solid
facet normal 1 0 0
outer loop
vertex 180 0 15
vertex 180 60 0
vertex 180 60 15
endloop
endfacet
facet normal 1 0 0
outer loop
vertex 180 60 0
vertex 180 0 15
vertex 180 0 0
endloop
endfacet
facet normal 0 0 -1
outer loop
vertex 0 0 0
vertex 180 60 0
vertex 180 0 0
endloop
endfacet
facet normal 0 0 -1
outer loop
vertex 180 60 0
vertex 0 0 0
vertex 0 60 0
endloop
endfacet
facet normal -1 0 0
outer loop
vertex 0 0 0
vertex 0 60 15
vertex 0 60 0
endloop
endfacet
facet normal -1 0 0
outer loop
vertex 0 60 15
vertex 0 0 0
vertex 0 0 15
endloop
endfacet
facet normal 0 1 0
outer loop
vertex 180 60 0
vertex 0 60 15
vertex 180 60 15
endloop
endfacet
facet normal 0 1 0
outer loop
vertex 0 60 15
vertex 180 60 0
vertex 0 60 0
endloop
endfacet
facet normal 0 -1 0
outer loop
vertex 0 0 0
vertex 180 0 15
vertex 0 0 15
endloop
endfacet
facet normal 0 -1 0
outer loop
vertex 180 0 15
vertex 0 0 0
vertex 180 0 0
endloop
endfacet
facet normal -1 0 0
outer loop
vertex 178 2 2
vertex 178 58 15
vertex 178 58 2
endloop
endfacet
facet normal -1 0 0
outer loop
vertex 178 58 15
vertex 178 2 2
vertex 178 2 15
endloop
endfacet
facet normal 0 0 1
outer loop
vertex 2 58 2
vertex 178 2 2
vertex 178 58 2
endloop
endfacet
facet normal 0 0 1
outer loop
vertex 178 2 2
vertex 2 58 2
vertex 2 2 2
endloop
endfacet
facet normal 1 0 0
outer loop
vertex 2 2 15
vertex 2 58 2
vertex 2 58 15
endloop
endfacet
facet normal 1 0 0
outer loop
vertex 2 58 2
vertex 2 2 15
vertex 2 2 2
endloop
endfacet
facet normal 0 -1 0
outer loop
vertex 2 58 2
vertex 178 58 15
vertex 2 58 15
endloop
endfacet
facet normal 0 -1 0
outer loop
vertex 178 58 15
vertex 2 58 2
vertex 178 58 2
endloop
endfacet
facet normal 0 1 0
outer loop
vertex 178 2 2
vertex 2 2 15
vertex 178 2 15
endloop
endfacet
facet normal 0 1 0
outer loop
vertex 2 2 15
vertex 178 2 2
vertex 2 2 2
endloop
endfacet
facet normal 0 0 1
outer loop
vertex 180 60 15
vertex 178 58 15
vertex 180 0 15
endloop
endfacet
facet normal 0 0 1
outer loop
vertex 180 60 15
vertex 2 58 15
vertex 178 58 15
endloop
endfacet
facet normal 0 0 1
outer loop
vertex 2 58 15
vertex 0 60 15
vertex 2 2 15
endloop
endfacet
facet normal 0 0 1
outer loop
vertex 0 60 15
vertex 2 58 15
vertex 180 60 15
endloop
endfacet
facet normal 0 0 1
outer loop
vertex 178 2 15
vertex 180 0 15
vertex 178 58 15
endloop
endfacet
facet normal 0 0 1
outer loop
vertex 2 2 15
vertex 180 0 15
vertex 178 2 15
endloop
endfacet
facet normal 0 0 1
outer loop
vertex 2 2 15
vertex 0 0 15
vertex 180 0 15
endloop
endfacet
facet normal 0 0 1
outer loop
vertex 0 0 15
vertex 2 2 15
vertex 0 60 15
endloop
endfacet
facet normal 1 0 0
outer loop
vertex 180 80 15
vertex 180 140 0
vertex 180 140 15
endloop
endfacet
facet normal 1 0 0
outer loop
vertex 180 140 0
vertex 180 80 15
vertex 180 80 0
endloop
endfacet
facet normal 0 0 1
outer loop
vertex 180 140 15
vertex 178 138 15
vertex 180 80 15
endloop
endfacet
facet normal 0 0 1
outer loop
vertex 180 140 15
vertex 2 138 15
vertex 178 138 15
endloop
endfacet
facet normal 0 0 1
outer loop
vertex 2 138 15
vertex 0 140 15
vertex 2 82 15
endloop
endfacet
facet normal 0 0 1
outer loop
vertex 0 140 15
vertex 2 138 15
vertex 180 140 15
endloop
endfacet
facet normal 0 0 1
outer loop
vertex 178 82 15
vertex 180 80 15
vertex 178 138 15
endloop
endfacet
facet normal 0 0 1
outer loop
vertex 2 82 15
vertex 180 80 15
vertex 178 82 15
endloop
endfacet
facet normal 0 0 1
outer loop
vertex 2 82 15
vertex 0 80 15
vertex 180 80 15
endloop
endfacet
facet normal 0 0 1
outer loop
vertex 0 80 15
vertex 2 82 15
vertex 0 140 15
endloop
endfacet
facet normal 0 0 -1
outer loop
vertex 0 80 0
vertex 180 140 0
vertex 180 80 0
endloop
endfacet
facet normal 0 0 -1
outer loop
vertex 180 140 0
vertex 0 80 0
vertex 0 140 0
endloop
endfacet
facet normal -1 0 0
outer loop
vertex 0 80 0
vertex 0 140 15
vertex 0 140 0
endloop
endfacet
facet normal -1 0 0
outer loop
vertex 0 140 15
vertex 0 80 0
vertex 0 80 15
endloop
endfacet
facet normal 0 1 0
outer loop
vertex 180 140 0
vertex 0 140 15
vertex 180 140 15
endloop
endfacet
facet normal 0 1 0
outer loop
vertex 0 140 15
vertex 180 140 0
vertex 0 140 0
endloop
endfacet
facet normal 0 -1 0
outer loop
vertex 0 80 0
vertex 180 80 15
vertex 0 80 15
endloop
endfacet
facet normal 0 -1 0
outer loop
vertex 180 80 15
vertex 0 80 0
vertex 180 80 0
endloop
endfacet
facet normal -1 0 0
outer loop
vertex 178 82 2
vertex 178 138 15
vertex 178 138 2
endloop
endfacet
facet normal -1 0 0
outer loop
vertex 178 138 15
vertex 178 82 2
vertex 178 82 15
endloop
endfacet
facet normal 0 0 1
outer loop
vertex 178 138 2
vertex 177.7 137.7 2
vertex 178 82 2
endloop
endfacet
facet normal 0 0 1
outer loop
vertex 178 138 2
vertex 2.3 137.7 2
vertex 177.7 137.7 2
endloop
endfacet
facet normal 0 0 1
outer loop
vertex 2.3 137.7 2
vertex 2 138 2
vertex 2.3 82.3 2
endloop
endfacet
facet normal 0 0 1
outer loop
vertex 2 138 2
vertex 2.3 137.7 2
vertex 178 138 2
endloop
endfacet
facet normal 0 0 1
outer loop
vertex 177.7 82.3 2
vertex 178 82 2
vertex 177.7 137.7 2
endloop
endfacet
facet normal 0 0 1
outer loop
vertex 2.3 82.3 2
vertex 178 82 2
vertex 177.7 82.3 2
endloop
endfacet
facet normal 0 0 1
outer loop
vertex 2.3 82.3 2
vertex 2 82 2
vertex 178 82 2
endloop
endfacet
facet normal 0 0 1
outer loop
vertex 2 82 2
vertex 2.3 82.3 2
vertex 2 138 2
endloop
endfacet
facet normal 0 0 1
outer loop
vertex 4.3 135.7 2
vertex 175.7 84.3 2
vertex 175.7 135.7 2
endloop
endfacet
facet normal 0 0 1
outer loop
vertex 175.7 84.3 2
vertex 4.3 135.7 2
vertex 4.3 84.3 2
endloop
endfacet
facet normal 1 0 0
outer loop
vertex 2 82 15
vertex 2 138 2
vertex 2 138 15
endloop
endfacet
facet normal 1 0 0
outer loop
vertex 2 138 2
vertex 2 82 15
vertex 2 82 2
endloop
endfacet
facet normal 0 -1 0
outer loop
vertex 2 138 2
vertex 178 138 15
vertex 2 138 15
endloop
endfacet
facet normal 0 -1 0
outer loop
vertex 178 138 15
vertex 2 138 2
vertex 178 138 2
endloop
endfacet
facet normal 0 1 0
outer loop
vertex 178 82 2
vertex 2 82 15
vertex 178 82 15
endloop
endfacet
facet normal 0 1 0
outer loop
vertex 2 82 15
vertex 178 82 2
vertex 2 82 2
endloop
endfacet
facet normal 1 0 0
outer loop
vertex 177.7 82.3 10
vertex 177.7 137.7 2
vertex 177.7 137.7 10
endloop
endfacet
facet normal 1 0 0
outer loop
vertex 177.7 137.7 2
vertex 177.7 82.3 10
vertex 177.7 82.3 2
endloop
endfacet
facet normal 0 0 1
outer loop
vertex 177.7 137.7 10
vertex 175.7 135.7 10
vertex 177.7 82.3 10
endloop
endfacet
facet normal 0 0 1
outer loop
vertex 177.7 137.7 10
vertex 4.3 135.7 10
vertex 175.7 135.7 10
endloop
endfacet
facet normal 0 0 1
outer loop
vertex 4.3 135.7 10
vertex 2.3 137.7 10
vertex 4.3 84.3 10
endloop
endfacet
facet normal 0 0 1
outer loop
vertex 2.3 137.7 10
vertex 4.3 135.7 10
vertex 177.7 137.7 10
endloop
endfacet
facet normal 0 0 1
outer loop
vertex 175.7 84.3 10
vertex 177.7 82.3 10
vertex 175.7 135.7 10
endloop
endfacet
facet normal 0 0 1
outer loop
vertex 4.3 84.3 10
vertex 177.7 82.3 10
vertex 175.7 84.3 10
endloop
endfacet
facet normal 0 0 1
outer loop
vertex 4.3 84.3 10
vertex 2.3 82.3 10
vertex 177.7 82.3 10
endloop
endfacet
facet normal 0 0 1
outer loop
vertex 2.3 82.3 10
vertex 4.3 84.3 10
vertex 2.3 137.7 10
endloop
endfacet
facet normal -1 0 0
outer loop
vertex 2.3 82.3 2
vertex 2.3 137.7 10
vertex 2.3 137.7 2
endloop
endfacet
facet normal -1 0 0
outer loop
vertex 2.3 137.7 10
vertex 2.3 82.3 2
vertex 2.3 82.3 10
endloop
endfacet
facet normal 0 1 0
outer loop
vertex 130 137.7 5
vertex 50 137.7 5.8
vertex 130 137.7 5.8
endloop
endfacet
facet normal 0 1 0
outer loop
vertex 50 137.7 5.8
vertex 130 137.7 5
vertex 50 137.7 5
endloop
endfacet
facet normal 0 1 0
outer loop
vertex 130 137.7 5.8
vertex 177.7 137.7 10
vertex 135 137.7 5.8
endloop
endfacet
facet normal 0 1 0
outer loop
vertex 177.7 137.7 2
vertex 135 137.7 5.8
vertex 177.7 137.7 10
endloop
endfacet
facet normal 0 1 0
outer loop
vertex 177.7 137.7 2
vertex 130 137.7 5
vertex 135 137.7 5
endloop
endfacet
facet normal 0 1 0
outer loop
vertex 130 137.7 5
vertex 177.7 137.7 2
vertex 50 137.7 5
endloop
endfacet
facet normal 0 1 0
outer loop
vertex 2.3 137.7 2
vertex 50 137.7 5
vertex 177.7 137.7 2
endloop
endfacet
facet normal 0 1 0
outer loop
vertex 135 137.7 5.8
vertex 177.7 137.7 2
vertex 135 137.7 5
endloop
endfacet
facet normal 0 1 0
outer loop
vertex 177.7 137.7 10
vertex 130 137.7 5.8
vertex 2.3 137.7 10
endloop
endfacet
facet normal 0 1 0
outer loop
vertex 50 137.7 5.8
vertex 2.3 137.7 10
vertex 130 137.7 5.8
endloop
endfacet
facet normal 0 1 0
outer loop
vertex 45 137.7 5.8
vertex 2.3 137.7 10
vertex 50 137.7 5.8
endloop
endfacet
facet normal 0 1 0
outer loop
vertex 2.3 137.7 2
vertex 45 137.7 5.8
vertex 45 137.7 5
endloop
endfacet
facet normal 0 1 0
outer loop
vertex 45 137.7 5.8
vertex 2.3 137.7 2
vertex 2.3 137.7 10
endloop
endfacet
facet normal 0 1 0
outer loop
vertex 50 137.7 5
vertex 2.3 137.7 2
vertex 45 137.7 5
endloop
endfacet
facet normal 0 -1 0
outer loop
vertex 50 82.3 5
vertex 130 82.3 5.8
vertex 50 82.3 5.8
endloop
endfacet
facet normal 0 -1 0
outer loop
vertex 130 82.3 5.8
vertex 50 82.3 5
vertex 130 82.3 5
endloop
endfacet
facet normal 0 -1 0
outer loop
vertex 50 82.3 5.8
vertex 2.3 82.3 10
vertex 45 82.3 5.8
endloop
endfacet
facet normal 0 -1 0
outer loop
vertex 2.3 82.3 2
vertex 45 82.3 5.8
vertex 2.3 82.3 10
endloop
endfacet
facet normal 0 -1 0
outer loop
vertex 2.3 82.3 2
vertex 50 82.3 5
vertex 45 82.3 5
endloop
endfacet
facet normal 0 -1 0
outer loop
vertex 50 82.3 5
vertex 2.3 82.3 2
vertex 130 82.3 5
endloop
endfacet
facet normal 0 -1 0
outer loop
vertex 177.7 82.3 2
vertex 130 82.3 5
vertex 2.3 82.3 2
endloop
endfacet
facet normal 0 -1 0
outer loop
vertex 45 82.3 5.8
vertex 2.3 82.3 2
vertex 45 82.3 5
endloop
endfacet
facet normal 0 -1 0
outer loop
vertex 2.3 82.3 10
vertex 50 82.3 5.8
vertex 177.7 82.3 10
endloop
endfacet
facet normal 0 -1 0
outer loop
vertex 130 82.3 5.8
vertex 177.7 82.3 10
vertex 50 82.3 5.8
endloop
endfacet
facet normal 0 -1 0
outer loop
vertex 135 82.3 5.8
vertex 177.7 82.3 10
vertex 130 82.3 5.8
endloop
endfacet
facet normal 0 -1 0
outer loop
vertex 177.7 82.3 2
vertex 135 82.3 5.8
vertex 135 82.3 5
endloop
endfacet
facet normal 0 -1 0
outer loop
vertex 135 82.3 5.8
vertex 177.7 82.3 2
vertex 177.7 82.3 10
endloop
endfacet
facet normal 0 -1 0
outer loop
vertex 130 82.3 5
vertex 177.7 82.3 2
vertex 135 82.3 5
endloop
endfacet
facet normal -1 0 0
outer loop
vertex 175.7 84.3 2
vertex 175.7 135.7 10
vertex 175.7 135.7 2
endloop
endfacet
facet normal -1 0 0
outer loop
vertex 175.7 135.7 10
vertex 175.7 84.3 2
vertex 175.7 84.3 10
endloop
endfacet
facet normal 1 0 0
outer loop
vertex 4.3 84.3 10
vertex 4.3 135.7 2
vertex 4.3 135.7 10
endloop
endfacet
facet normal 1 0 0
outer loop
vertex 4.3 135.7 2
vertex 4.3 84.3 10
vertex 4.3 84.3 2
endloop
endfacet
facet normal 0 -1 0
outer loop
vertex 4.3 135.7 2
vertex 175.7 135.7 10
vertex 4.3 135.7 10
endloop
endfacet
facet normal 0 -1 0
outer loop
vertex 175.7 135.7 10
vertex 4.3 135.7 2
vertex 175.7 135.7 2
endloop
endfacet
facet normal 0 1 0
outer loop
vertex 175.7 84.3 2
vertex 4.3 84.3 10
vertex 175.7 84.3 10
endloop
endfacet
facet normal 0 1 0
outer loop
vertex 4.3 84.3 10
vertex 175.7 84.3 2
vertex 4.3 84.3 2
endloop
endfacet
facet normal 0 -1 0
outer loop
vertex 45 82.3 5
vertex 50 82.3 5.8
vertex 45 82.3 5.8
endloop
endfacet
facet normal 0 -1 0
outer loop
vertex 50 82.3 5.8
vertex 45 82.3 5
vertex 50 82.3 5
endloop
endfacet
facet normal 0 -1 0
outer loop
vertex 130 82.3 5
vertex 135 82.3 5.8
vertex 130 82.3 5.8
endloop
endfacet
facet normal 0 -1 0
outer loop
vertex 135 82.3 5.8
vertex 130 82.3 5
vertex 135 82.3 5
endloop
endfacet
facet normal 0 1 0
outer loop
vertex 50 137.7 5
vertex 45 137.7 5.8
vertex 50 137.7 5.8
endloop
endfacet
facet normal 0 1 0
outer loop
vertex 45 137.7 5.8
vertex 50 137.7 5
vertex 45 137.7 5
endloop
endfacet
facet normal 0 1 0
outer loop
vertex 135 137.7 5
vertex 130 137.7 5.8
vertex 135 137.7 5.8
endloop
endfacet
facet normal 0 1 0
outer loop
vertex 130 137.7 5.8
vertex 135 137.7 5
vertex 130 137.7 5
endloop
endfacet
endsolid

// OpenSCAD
// Pencil Case with Friction-Fit Lid
// Measurements in mm

/* Parameters */
// Main box dimensions
box_length = 180;    // Long enough for standard pencils
box_width = 60;      // Wide enough for multiple pencils and an eraser
box_height = 25;     // Height for pencils and small items
wall_thickness = 2;  // Wall thickness

// Lid dimensions
lid_height = 15;     // Height of the lid
lid_clearance = 0.3; // Clearance for friction fit (smaller = tighter fit)
lid_overlap = 10;    // How much the lid overlaps the box

// Friction bump parameters
bump_height = 0.8;   // Height of the friction bumps
bump_width = 5;      // Width of the friction bumps

/* Main Box */
module pencil_box() {
    difference() {
        // Outer box
        cube([box_length, box_width, box_height]);
        
        // Inner hollow
        translate([wall_thickness, wall_thickness, wall_thickness])
            cube([
                box_length - wall_thickness * 2, 
                box_width - wall_thickness * 2, 
                box_height + 1
            ]);
        
        // Cutout for lid
        translate([0, 0, box_height - lid_overlap])
            cube([
                box_length, 
                box_width, 
                lid_overlap + 1
            ]);
        
        // Friction bumps (indented into the box)
        translate([box_length/4, -1, box_height - lid_overlap/2])
            cube([bump_width, wall_thickness + 2, bump_height]);
        
        translate([box_length*3/4 - bump_width, -1, box_height - lid_overlap/2])
            cube([bump_width, wall_thickness + 2, bump_height]);
            
        translate([box_length/4, box_width - wall_thickness - 1, box_height - lid_overlap/2])
            cube([bump_width, wall_thickness + 2, bump_height]);
            
        translate([box_length*3/4 - bump_width, box_width - wall_thickness - 1, box_height - lid_overlap/2])
            cube([bump_width, wall_thickness + 2, bump_height]);
    }
}

/* Lid */
module pencil_lid() {
    difference() {
        // Outer lid
        cube([box_length, box_width, lid_height]);
        
        // Inner hollow
        translate([wall_thickness, wall_thickness, wall_thickness])
            cube([
                box_length - wall_thickness * 2, 
                box_width - wall_thickness * 2, 
                lid_height + 1
            ]);
    }
    
    // Inner lip that fits into the box
    translate([wall_thickness + lid_clearance, wall_thickness + lid_clearance, 0])
        difference() {
            cube([
                box_length - (wall_thickness + lid_clearance) * 2, 
                box_width - (wall_thickness + lid_clearance) * 2, 
                lid_overlap
            ]);
            
            // Hollow out the lip
            translate([wall_thickness, wall_thickness, -1])
                cube([
                    box_length - (wall_thickness + lid_clearance) * 2 - wall_thickness * 2, 
                    box_width - (wall_thickness + lid_clearance) * 2 - wall_thickness * 2, 
                    lid_overlap + 2
                ]);
        }
    
    // Friction bumps (extruded from the lid)
    translate([box_length/4, wall_thickness + lid_clearance, lid_overlap/2])
        cube([bump_width, bump_height, bump_height]);
    
    translate([box_length*3/4 - bump_width, wall_thickness + lid_clearance, lid_overlap/2])
        cube([bump_width, bump_height, bump_height]);
        
    translate([box_length/4, box_width - wall_thickness - lid_clearance - bump_height, lid_overlap/2])
        cube([bump_width, bump_height, bump_height]);
        
    translate([box_length*3/4 - bump_width, box_width - wall_thickness - lid_clearance - bump_height, lid_overlap/2])
        cube([bump_width, bump_height, bump_height]);
}

/* Render your choice by commenting/uncommenting */
// Render both parts separated for viewing
translate([0, 0, 0]) pencil_box();
translate([0, box_width + 20, 0]) pencil_lid();

// Uncomment to see the assembled case
// pencil_box();
// translate([0, 0, box_height - lid_overlap]) pencil_lid();
